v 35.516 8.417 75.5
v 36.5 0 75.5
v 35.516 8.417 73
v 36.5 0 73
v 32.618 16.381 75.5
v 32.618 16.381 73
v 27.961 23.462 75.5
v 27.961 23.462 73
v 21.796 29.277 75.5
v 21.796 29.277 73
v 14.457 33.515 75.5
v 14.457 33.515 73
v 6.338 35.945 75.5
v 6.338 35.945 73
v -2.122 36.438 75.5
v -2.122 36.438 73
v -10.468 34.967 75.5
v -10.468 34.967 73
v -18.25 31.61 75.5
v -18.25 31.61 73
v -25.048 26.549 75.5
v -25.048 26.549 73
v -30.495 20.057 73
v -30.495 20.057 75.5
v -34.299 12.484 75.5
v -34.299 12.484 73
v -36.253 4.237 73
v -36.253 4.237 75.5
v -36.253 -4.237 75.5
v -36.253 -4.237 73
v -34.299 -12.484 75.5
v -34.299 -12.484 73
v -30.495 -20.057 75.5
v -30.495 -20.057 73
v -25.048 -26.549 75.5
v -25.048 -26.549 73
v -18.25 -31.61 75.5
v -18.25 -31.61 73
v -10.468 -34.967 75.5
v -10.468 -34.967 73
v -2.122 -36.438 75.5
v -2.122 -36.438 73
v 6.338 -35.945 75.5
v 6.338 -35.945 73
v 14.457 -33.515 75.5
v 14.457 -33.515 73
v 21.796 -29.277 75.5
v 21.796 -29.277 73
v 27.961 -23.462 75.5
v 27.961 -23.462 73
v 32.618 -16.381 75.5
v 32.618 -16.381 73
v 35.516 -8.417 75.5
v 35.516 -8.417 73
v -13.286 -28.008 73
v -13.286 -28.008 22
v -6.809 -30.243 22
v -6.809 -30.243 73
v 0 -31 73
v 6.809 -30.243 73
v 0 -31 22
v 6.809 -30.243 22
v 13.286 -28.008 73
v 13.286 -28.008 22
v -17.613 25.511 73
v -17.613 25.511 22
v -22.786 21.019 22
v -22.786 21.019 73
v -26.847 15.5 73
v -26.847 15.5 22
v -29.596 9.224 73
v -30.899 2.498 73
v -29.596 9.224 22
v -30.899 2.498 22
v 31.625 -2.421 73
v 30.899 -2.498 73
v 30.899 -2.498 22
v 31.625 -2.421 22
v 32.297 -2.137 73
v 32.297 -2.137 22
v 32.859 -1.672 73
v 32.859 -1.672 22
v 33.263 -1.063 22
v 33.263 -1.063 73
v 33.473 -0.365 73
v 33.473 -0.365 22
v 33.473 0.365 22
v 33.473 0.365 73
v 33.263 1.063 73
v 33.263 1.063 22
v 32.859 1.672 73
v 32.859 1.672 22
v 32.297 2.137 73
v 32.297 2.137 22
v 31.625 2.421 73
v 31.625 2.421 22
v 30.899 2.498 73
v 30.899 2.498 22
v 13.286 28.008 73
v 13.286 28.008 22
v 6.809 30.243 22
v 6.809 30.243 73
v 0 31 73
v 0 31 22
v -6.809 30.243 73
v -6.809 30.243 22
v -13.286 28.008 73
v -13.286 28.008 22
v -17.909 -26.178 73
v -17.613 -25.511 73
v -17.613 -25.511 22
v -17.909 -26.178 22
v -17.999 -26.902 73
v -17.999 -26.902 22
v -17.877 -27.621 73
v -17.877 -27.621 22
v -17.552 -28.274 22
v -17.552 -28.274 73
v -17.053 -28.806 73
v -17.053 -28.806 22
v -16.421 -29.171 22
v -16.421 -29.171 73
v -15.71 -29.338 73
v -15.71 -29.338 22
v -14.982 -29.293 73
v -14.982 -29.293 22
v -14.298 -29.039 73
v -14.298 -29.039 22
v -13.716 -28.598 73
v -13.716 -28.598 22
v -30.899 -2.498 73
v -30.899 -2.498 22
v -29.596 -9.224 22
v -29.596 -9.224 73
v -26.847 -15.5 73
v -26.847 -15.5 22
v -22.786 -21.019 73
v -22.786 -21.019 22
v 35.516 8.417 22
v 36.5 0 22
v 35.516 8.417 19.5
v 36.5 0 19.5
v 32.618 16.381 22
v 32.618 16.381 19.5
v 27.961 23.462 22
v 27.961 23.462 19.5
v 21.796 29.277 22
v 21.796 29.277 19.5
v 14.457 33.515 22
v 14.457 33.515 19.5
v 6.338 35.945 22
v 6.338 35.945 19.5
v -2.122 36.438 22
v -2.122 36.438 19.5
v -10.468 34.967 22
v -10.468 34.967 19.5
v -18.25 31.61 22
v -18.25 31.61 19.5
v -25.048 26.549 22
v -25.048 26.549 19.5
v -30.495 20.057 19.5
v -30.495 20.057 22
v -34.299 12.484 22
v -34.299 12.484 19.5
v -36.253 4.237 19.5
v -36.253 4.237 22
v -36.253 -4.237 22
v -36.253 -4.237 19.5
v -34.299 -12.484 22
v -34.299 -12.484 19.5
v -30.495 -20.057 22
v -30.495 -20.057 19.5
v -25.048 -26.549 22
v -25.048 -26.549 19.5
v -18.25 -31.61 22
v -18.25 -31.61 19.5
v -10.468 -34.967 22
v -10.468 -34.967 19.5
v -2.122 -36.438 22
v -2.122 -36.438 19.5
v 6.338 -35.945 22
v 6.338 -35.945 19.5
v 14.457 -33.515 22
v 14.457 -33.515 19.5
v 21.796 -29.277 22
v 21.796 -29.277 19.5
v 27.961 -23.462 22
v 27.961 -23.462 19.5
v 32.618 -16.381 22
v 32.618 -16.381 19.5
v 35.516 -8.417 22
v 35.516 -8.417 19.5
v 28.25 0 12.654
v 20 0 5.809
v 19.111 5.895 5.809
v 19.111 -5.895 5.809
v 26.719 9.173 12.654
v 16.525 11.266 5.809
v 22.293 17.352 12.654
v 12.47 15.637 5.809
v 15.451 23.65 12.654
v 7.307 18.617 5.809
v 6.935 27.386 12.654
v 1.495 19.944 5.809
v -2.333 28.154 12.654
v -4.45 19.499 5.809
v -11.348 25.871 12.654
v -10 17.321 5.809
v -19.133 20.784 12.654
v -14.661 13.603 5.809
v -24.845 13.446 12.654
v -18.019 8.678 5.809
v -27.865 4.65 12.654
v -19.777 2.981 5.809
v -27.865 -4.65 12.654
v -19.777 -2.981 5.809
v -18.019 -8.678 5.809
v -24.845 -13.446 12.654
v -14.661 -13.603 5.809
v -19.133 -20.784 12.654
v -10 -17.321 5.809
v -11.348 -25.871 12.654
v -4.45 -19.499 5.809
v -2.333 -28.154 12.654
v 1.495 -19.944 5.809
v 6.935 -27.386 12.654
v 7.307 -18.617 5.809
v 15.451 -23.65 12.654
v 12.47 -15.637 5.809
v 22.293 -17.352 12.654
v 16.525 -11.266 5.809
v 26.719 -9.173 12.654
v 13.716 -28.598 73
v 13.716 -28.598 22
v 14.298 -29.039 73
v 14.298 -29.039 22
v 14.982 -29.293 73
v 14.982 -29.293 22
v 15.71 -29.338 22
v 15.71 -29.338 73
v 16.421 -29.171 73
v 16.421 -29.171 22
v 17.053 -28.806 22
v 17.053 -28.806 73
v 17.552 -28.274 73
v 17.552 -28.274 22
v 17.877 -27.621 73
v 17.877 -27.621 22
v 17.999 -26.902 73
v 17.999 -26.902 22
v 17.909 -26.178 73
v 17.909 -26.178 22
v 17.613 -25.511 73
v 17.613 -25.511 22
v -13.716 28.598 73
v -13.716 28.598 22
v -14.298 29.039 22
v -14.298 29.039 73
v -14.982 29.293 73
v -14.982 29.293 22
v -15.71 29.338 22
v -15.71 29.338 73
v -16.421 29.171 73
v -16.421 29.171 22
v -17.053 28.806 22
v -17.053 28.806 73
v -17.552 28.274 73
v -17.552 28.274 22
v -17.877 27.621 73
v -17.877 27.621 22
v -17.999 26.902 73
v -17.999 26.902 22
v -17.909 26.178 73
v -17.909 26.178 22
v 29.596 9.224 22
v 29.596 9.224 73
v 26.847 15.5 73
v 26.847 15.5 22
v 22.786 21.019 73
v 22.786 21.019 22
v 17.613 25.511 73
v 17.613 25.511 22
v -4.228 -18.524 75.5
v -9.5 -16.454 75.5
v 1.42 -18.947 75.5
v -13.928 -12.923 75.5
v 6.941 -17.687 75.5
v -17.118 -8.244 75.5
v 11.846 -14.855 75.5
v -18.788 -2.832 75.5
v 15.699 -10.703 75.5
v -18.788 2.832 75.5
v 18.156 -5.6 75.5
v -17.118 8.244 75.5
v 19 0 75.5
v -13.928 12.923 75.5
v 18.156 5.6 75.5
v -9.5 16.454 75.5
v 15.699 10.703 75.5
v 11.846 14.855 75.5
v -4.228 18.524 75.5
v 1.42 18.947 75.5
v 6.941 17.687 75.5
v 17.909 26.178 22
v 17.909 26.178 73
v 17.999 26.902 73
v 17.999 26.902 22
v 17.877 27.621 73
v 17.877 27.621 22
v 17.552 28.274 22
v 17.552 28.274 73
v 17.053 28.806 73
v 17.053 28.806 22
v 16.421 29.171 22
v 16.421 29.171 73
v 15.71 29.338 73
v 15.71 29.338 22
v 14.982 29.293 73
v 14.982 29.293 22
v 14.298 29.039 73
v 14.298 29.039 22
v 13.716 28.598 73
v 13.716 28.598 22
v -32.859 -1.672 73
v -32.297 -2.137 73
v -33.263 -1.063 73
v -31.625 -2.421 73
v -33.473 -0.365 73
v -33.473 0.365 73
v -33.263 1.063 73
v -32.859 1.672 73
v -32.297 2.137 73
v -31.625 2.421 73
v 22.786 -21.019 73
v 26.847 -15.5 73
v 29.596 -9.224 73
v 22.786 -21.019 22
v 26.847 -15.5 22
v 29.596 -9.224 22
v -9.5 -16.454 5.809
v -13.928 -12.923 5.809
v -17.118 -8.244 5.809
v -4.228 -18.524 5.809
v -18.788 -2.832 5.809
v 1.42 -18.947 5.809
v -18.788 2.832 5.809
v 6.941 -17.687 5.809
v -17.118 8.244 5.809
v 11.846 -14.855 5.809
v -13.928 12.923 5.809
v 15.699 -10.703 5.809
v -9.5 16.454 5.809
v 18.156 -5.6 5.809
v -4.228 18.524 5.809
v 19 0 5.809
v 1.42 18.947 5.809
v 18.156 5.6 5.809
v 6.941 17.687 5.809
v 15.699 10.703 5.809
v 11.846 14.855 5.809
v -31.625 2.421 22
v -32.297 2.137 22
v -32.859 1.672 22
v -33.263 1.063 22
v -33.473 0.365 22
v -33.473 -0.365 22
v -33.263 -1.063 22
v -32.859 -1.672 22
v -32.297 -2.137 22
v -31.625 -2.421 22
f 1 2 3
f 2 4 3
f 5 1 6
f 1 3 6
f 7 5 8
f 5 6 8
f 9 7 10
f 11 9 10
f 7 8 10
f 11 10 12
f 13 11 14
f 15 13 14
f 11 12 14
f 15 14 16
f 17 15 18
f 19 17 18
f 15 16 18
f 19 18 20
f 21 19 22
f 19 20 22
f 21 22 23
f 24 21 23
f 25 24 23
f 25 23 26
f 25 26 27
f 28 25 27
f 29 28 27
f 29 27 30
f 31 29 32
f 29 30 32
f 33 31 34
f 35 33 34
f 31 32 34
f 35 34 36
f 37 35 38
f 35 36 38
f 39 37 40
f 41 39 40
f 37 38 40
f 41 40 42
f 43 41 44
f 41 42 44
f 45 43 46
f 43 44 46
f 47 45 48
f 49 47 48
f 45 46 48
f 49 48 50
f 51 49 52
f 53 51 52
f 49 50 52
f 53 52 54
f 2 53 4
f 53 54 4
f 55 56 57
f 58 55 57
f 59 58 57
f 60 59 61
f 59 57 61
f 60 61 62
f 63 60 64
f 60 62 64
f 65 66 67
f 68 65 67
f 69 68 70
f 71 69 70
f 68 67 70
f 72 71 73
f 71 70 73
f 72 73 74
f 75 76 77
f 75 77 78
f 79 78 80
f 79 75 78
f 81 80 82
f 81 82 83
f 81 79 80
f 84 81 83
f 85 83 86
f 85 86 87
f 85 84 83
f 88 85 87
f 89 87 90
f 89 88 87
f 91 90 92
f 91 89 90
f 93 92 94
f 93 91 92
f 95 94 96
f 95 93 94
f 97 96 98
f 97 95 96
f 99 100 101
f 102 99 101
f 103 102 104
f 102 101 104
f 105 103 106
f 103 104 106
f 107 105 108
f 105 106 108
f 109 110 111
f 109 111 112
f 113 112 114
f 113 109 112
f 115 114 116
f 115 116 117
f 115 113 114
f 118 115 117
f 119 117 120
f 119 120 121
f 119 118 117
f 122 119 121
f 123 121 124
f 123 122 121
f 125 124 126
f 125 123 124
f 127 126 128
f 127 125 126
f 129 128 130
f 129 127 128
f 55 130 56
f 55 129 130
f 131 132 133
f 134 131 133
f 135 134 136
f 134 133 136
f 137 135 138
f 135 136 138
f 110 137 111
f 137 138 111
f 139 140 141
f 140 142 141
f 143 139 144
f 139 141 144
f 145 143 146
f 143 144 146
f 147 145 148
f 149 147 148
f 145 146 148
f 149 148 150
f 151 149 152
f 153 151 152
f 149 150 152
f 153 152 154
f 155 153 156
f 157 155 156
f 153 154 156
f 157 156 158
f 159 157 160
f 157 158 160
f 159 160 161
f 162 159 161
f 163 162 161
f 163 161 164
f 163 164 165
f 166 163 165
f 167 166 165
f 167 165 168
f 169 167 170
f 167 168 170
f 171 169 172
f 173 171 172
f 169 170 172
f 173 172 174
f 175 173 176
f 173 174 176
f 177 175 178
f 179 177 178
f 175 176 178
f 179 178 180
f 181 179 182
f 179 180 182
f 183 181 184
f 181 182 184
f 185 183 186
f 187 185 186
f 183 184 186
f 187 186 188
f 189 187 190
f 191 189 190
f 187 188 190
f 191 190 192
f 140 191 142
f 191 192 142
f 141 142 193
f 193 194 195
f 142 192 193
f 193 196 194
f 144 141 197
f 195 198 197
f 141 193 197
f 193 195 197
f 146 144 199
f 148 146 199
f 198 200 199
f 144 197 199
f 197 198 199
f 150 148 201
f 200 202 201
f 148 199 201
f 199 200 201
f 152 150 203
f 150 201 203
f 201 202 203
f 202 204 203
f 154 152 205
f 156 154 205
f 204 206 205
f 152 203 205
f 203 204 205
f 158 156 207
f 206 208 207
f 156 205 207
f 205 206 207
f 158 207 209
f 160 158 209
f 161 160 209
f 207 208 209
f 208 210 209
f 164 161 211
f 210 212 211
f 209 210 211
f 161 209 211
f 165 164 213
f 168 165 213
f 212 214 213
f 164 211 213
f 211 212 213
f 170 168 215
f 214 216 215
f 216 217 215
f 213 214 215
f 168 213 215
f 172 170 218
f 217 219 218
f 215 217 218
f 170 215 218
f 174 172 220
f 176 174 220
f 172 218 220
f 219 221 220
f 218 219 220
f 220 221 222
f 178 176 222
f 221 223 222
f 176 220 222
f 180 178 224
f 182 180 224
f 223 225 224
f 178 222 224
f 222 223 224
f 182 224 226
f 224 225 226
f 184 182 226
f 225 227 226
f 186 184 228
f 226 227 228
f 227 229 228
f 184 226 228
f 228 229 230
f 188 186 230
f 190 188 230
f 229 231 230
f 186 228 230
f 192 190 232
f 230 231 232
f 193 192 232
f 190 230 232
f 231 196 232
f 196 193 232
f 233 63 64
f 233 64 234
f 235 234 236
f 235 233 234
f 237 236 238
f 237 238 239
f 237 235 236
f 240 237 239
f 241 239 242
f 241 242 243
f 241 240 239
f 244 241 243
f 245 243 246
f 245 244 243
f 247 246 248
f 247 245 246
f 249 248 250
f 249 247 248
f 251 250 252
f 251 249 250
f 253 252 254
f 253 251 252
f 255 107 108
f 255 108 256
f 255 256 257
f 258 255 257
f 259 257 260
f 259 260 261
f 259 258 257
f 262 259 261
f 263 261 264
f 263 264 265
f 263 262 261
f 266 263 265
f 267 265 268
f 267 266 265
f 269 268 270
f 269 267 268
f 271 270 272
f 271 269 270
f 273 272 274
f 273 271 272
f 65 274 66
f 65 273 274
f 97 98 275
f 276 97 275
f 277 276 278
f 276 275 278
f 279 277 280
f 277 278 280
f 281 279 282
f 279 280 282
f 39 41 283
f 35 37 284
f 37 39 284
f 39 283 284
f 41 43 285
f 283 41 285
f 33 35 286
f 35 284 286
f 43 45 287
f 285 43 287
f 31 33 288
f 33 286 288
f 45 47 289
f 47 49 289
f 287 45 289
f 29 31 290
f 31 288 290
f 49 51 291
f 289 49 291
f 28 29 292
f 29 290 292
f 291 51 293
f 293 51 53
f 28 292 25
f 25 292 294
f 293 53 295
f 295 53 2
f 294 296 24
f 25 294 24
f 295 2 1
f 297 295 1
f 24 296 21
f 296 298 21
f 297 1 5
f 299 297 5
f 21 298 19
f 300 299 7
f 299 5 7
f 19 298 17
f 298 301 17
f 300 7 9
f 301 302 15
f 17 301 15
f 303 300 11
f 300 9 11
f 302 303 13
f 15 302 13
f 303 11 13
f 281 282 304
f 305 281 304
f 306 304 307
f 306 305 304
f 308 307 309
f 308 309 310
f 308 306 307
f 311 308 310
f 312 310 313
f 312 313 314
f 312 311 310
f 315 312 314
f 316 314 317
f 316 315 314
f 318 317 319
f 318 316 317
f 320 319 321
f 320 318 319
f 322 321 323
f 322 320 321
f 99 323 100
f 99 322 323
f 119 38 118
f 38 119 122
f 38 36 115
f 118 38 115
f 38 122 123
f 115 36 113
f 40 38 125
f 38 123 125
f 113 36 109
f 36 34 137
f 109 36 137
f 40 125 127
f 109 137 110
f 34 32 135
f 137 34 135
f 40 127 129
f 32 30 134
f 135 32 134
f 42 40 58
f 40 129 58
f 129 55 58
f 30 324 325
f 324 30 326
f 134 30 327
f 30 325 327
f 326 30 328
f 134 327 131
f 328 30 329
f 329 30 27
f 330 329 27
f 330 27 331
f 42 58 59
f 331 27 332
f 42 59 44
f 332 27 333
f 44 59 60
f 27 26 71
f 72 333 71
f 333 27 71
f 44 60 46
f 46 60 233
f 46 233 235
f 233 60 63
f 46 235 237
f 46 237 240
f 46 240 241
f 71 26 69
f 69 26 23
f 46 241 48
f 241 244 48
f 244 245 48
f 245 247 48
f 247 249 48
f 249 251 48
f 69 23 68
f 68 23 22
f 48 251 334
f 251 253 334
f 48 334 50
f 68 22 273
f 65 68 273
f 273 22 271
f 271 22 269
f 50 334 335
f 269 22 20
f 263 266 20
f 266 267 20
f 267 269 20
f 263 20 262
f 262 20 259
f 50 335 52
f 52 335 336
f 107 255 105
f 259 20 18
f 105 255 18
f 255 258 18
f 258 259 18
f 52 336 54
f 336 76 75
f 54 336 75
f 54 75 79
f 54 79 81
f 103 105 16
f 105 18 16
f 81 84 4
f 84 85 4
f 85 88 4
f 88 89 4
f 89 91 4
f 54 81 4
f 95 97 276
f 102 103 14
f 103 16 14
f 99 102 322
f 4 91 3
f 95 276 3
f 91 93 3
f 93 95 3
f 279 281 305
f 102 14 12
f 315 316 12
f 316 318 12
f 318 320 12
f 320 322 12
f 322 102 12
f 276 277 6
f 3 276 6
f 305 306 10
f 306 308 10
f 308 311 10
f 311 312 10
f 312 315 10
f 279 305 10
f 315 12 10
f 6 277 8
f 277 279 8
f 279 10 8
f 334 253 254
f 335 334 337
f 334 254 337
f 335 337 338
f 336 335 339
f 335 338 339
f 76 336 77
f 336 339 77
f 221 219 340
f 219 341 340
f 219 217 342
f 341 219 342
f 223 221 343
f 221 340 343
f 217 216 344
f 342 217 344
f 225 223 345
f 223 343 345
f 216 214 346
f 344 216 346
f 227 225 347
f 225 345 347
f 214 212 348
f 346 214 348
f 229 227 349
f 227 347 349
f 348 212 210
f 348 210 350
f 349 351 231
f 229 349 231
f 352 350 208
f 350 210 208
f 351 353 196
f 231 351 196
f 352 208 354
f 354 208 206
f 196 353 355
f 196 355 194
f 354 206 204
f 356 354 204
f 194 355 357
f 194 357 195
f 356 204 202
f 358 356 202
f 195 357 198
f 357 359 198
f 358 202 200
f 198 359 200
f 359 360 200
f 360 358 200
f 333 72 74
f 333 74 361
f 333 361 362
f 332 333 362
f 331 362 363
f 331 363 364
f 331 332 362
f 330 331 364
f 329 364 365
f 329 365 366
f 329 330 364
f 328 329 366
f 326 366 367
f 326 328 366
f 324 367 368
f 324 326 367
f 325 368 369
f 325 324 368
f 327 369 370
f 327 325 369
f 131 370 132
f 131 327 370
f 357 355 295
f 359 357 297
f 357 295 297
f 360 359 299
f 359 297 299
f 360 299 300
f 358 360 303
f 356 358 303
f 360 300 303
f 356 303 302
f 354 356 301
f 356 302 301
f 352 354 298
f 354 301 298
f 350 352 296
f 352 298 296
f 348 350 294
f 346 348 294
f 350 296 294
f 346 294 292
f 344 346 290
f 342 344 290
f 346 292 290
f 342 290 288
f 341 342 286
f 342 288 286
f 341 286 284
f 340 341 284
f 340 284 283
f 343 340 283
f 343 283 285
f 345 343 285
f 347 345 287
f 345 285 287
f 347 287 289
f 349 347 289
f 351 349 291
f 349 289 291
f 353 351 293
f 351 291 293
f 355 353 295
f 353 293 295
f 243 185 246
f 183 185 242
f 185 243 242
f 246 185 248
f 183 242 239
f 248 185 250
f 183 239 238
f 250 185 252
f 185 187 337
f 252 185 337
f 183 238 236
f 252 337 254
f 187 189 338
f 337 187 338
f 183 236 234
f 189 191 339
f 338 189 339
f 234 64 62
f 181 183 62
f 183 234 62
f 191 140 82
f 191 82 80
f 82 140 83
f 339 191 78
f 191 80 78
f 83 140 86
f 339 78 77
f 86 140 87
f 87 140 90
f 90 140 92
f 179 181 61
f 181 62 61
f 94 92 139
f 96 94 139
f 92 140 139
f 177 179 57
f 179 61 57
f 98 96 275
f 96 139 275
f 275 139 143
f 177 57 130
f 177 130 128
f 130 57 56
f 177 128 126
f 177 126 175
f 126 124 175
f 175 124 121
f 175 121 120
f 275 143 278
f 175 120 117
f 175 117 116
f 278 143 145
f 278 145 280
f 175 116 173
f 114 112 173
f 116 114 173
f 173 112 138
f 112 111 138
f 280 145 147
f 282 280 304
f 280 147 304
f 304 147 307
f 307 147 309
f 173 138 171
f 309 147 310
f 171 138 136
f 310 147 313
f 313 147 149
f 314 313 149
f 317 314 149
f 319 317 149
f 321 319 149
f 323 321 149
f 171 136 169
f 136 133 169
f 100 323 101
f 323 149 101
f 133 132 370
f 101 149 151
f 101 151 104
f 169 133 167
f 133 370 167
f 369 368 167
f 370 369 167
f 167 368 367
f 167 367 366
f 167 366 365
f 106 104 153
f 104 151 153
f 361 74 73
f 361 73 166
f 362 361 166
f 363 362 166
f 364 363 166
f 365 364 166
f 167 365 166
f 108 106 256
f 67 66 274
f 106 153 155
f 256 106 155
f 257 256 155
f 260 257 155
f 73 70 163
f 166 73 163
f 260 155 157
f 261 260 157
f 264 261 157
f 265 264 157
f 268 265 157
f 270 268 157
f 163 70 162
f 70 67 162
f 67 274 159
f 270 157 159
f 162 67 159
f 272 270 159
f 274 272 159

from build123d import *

# Parameters (mm, degrees)
PAD_DEPTH          = 56
POLARPATTERN_COUNT = 6


with BuildPart() as part:
    # Sketch → Revolution002 (revolve)
    with BuildSketch(Plane.XZ):
        Polygon((19, 5.8085106383), (19, 75.5), (36.5, 75.5), (36.5, 73), (31, 73), (31, 22), (36.5, 22), (36.5, 19.5), (20, 5.8085106383), align=None)
    revolve(axis=Axis((0, 0, 0), (0, 0, 1)))

    # Sketch004 → Pad (new body)
    with BuildSketch(Plane.XY.offset(75.5)):
        with BuildLine():
            ThreePointArc((30.8991935484, -2.4979667851), (31, 0), (30.8991935484, 2.4979667851))
            ThreePointArc((30.8991935484, -2.4979667851), (33.5, 0), (30.8991935484, 2.4979667851))
        make_face()
    pad = extrude(amount=-PAD_DEPTH)

    # PolarPattern: Pad ×6 about axis
    polarpattern_axis = Axis((0, 0, 75.5), (0, 0, 1))
    for i in range(1, POLARPATTERN_COUNT):
        add(pad.rotate(polarpattern_axis, i * 360 / POLARPATTERN_COUNT))


solid = part.part
